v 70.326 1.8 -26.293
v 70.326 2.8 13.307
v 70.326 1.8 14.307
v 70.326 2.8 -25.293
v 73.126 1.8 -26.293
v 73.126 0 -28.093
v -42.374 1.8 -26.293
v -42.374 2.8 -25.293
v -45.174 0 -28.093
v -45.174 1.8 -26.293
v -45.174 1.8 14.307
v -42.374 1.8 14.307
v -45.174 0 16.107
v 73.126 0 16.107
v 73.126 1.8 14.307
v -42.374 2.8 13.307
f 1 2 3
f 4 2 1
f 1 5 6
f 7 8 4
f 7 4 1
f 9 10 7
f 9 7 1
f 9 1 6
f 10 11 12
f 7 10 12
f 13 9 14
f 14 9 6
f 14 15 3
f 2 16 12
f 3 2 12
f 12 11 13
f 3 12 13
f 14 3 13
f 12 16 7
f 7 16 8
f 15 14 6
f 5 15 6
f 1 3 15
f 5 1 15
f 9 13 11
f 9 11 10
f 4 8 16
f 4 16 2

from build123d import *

# Parameters (mm, degrees)
SKETCH_1_W          = 118.3
SKETCH_1_H          = 44.2
EXTRUDE_1_DEPTH     = 2.8
SKETCH_2_W          = 2.8
SKETCH_2_H          = 44.2
CUT_EXTRUDE_1_DEPTH = 1
CUT_EXTRUDE_2_DEPTH = 122.622082534


with BuildPart() as part:
    # 草图1 → 凸台-拉伸1 (new body)
    with BuildSketch(Plane(origin=(0, 0, 0), x_dir=(1, 0, 0), z_dir=(0, 1, 0))):
        with Locations((13.975775656, 5.992720764)):
            Rectangle(SKETCH_1_W, SKETCH_1_H)
    extrude(amount=EXTRUDE_1_DEPTH)

    # 草图2 → 切除-拉伸1 (cut)
    with BuildSketch(Plane(origin=(0, 2.8, 0), x_dir=(1, 0, 0), z_dir=(0, 1, 0))):
        with Locations((-43.774224344, 5.992720764)):
            Rectangle(SKETCH_2_W, SKETCH_2_H)
        with Locations((71.725775656, 5.992720764)):
            Rectangle(SKETCH_2_W, SKETCH_2_H)
    extrude(amount=-CUT_EXTRUDE_1_DEPTH, mode=Mode.SUBTRACT)

    # 草图3 → 切除-拉伸2 (cut, through all)
    with BuildSketch(Plane.ZY.offset(45.174224344)):
        Polygon((-28.092720764, 0), (-28.092720764, 2.8), (-25.292720764, 2.8), align=None)
        Polygon((16.107279236, 0), (16.107279236, 2.8), (13.307279236, 2.8), align=None)
    extrude(amount=-CUT_EXTRUDE_2_DEPTH, mode=Mode.SUBTRACT)


solid = part.part
